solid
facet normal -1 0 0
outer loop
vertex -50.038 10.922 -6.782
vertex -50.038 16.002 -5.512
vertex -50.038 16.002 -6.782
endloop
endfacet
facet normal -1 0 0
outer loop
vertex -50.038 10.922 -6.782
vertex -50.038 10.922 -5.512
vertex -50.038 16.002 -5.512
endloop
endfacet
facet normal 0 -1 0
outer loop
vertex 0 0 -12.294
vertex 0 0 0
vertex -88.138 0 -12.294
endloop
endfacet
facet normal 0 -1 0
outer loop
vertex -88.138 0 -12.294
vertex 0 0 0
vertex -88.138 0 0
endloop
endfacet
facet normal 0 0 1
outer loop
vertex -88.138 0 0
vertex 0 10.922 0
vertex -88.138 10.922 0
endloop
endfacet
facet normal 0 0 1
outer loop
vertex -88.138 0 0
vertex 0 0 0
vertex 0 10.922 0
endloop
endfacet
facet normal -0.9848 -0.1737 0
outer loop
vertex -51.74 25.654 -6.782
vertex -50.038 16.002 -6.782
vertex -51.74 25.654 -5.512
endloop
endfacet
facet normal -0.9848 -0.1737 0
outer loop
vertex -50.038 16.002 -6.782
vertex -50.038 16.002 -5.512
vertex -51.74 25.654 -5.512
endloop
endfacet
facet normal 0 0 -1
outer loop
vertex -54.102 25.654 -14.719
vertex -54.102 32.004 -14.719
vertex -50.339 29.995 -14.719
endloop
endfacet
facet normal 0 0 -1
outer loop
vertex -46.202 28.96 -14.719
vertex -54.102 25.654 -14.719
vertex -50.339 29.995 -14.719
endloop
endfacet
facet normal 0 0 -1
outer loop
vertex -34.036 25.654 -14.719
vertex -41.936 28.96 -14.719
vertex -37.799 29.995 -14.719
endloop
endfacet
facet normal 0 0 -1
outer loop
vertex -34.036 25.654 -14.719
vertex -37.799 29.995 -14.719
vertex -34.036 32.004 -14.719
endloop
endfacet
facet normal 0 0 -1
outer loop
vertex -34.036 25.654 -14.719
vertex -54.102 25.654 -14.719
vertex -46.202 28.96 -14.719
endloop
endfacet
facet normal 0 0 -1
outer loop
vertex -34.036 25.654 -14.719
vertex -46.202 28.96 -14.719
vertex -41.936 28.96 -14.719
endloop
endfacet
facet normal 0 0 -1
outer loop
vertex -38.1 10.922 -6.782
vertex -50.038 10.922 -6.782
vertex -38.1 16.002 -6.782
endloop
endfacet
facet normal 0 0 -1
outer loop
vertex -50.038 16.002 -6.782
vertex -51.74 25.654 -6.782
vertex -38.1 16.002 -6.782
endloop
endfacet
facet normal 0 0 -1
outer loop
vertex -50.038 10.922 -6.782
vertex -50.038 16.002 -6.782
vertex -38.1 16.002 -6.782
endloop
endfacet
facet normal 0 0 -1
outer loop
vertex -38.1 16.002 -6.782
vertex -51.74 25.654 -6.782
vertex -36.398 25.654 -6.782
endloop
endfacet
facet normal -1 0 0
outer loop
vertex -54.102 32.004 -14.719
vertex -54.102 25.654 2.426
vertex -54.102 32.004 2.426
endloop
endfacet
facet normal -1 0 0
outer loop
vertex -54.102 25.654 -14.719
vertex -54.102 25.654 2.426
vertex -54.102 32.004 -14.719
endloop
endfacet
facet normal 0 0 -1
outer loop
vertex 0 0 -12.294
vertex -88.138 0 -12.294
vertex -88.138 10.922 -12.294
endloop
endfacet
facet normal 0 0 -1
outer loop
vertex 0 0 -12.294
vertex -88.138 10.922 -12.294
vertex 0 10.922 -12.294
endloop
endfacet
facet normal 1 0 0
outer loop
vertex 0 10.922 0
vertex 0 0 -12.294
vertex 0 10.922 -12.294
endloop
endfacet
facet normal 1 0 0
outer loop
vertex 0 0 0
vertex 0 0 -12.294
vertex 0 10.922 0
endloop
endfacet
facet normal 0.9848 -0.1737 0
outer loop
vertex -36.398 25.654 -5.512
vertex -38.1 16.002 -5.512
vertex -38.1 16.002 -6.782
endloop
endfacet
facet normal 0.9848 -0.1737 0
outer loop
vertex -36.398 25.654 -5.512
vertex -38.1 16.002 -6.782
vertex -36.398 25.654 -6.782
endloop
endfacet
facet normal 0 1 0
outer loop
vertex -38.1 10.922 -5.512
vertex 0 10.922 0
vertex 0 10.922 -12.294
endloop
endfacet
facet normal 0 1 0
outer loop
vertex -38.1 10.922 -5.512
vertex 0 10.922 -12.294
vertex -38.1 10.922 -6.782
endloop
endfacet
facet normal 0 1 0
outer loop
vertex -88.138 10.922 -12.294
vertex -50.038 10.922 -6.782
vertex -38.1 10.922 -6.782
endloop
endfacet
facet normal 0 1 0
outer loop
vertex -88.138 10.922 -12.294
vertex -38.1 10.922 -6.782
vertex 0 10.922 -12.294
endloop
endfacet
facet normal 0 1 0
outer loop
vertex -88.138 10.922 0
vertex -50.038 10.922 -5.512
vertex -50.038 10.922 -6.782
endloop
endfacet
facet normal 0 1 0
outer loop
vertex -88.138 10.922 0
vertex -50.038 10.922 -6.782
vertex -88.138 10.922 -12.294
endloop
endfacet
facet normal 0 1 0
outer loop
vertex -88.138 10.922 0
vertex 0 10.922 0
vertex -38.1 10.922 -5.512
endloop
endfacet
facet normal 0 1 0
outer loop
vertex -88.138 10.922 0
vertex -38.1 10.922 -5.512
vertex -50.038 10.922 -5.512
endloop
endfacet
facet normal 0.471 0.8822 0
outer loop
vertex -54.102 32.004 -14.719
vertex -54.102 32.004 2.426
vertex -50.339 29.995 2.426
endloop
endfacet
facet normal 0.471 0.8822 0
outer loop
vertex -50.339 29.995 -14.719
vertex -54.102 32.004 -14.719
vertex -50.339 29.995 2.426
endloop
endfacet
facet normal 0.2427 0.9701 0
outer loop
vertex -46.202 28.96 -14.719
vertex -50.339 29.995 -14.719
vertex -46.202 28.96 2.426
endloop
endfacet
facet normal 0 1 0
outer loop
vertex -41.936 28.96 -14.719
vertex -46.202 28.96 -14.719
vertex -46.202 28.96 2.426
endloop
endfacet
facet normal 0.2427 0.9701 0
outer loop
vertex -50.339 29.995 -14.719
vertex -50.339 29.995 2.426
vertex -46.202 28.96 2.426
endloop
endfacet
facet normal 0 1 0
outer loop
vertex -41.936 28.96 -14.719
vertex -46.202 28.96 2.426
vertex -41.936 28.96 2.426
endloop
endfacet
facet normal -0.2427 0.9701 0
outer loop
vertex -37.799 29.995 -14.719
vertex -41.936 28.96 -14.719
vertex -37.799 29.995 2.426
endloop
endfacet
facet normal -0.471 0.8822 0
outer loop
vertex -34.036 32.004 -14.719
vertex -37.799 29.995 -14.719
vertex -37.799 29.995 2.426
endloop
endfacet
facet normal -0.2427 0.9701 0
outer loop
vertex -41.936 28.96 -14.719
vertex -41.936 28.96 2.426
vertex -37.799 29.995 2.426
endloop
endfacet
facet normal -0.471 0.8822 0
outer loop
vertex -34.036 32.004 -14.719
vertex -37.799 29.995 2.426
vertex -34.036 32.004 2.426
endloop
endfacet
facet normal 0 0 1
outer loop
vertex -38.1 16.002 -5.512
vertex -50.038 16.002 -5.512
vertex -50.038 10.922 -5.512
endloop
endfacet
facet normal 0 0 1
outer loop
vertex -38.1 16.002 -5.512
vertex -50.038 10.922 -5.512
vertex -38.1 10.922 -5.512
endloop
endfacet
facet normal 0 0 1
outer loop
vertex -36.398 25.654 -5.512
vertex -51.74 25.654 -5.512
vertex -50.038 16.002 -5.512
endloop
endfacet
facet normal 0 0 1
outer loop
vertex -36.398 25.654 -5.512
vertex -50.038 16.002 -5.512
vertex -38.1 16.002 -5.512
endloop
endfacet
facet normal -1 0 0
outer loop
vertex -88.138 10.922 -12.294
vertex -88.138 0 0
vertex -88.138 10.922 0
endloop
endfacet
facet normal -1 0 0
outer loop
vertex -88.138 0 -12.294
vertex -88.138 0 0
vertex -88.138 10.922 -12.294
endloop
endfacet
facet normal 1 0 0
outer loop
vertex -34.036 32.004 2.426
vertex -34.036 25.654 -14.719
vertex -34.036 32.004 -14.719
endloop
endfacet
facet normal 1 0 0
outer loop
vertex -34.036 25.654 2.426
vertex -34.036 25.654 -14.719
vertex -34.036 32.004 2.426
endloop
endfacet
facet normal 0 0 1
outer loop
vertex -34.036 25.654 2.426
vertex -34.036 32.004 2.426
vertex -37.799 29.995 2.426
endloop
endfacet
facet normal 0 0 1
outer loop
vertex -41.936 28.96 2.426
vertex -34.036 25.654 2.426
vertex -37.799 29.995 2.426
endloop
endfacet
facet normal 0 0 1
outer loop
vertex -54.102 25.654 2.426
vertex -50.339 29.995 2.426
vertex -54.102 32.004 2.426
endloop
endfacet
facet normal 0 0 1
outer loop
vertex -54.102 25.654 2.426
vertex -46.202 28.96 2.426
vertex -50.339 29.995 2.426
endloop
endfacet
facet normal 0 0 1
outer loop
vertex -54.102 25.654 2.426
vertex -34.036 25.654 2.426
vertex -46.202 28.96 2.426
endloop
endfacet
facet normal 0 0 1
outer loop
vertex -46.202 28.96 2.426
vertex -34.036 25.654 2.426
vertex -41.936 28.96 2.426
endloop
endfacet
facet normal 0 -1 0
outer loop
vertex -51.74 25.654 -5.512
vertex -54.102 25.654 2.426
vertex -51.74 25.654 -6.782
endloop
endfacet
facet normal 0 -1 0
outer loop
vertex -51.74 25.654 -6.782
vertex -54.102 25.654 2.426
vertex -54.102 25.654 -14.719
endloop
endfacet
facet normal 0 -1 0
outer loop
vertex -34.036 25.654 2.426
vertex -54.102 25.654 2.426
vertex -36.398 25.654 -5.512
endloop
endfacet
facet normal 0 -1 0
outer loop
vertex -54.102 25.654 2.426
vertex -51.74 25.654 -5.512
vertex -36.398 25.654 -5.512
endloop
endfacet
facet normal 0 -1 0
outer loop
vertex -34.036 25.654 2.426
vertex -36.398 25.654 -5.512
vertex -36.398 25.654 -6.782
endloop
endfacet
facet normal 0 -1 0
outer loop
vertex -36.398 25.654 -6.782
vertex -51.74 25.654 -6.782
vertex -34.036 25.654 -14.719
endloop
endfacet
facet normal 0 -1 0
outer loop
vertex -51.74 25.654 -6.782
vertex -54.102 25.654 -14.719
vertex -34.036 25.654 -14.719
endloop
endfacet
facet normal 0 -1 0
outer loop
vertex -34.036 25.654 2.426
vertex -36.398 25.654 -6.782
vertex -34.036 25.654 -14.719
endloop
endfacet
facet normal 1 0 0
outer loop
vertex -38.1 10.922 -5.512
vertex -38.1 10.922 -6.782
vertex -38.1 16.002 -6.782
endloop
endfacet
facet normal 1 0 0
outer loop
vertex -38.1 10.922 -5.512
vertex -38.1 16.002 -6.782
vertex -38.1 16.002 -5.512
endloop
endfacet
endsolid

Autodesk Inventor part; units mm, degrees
ref_plane "YZ Plane" through (0, 0, 0) normal (1, 0, 0) x (0, 1, 0)
ref_plane "XZ Plane" through (0, 0, 0) normal (0, 1, 0) x (-1, 0, 0)
ref_plane "XY Plane" through (0, 0, 0) normal (0, 0, 1) x (1, 0, 0)
sketch "Sketch1" plane through (0, 0, 0) normal (0, 1, 0) x (-1, 0, 0)
  line L0 (0, 0) -> (88.138, 0)
  line L1 (88.138, 0) -> (88.138, -12.2936)
  line L2 (88.138, -12.2936) -> (0, -12.2936)
  line L3 (0, -12.2936) -> (0, 0)
  dimension "d0" = 88.138
  dimension "d1" = 12.2936
extrude "Extrusion1" add sketch "Sketch1" along normal blind 10.922
sketch "Sketch2" plane through (0, 10.922, 0) normal (0, 1, 0) x (1, 0, 0)
  line L0 (-88.138, 12.2936) -> (-88.138, 0) projected
  line L1 (0, 0) -> (0, 12.2936) projected
  line L2 (-50.038, 6.7818) -> (-38.1, 6.7818)
  line L3 (-38.1, 6.7818) -> (-38.1, 5.5118)
  line L4 (-38.1, 5.5118) -> (-50.038, 5.5118)
  line L5 (-50.038, 5.5118) -> (-50.038, 6.7818)
  dimension "d7" = 11.938
  dimension "d8" = 1.27
extrude "Extrusion2" add sketch "Sketch2" along normal blind 5.08
sketch "Sketch4" plane through (-50.038, 10.922, -5.5118) normal (0, 0, 1) x (1, 0, 0)
  line L0 (0, 5.08) -> (11.938, 5.08)
  line L1 (11.938, 5.08) -> (0, 5.08) projected
  line L2 (11.938, 5.08) -> (13.6399, 14.732)
  line L3 (11.938, 5.08) -> (21.7389, 5.08) construction
  line L4 (0, 5.08) -> (-1.7019, 14.732)
  line L5 (0, 5.08) -> (9.8009, 5.08) construction
  line L6 (-1.7019, 14.732) -> (13.6399, 14.732)
  point P0 (50.038, -10.922)
  dimension "d12" = 80
  dimension "d13" = 100
extrude "Extrusion3" add sketch "Sketch4" against normal blind 1.27
sketch "Sketch5" plane through (-51.7399, 25.654, -5.5118) normal (0, 1, 0) x (1, 0, 0)
  line L0 (15.3418, 0) -> (0, 0) projected
  line L1 (15.3418, 0) -> (15.3418, 1.27) projected
  line L2 (0, 1.27) -> (15.3418, 1.27) projected
  line L3 (0, 0) -> (0, 1.27) projected
  line L4 (-2.3621, 0.635) -> (17.7039, 0.635)
  line L5 (-2.3621, 9.2075) -> (17.7039, 9.2075)
  line L6 (17.7039, 9.2075) -> (17.7039, -7.9375)
  line L7 (17.7039, -7.9375) -> (-2.3621, -7.9375)
  line L8 (-2.3621, -7.9375) -> (-2.3621, 9.2075)
  point P0 (51.7399, -5.5118)
  dimension "d19" = 20.066
  dimension "d21" = 17.145
  dimension "d22" = 8.5725
  dimension "d23" = 0.635
extrude "Extrusion4" add sketch "Sketch5" along normal blind 6.35
sketch "Sketch6" plane through (-54.102, 25.654, 2.4257) normal (0, 0, 1) x (1, 0, 0)
  arc A0 (0, 6.35) -> (20.066, 6.35) centre (10.033, 20.6146) ccw
  line L0 (0, 6.35) -> (20.066, 6.35)
  point P0 (54.102, -25.654)
extrude "Extrusion5" cut sketch "Sketch6" against normal blind 20.32
properties part number "SLIDE_POTENTIOMETER"
